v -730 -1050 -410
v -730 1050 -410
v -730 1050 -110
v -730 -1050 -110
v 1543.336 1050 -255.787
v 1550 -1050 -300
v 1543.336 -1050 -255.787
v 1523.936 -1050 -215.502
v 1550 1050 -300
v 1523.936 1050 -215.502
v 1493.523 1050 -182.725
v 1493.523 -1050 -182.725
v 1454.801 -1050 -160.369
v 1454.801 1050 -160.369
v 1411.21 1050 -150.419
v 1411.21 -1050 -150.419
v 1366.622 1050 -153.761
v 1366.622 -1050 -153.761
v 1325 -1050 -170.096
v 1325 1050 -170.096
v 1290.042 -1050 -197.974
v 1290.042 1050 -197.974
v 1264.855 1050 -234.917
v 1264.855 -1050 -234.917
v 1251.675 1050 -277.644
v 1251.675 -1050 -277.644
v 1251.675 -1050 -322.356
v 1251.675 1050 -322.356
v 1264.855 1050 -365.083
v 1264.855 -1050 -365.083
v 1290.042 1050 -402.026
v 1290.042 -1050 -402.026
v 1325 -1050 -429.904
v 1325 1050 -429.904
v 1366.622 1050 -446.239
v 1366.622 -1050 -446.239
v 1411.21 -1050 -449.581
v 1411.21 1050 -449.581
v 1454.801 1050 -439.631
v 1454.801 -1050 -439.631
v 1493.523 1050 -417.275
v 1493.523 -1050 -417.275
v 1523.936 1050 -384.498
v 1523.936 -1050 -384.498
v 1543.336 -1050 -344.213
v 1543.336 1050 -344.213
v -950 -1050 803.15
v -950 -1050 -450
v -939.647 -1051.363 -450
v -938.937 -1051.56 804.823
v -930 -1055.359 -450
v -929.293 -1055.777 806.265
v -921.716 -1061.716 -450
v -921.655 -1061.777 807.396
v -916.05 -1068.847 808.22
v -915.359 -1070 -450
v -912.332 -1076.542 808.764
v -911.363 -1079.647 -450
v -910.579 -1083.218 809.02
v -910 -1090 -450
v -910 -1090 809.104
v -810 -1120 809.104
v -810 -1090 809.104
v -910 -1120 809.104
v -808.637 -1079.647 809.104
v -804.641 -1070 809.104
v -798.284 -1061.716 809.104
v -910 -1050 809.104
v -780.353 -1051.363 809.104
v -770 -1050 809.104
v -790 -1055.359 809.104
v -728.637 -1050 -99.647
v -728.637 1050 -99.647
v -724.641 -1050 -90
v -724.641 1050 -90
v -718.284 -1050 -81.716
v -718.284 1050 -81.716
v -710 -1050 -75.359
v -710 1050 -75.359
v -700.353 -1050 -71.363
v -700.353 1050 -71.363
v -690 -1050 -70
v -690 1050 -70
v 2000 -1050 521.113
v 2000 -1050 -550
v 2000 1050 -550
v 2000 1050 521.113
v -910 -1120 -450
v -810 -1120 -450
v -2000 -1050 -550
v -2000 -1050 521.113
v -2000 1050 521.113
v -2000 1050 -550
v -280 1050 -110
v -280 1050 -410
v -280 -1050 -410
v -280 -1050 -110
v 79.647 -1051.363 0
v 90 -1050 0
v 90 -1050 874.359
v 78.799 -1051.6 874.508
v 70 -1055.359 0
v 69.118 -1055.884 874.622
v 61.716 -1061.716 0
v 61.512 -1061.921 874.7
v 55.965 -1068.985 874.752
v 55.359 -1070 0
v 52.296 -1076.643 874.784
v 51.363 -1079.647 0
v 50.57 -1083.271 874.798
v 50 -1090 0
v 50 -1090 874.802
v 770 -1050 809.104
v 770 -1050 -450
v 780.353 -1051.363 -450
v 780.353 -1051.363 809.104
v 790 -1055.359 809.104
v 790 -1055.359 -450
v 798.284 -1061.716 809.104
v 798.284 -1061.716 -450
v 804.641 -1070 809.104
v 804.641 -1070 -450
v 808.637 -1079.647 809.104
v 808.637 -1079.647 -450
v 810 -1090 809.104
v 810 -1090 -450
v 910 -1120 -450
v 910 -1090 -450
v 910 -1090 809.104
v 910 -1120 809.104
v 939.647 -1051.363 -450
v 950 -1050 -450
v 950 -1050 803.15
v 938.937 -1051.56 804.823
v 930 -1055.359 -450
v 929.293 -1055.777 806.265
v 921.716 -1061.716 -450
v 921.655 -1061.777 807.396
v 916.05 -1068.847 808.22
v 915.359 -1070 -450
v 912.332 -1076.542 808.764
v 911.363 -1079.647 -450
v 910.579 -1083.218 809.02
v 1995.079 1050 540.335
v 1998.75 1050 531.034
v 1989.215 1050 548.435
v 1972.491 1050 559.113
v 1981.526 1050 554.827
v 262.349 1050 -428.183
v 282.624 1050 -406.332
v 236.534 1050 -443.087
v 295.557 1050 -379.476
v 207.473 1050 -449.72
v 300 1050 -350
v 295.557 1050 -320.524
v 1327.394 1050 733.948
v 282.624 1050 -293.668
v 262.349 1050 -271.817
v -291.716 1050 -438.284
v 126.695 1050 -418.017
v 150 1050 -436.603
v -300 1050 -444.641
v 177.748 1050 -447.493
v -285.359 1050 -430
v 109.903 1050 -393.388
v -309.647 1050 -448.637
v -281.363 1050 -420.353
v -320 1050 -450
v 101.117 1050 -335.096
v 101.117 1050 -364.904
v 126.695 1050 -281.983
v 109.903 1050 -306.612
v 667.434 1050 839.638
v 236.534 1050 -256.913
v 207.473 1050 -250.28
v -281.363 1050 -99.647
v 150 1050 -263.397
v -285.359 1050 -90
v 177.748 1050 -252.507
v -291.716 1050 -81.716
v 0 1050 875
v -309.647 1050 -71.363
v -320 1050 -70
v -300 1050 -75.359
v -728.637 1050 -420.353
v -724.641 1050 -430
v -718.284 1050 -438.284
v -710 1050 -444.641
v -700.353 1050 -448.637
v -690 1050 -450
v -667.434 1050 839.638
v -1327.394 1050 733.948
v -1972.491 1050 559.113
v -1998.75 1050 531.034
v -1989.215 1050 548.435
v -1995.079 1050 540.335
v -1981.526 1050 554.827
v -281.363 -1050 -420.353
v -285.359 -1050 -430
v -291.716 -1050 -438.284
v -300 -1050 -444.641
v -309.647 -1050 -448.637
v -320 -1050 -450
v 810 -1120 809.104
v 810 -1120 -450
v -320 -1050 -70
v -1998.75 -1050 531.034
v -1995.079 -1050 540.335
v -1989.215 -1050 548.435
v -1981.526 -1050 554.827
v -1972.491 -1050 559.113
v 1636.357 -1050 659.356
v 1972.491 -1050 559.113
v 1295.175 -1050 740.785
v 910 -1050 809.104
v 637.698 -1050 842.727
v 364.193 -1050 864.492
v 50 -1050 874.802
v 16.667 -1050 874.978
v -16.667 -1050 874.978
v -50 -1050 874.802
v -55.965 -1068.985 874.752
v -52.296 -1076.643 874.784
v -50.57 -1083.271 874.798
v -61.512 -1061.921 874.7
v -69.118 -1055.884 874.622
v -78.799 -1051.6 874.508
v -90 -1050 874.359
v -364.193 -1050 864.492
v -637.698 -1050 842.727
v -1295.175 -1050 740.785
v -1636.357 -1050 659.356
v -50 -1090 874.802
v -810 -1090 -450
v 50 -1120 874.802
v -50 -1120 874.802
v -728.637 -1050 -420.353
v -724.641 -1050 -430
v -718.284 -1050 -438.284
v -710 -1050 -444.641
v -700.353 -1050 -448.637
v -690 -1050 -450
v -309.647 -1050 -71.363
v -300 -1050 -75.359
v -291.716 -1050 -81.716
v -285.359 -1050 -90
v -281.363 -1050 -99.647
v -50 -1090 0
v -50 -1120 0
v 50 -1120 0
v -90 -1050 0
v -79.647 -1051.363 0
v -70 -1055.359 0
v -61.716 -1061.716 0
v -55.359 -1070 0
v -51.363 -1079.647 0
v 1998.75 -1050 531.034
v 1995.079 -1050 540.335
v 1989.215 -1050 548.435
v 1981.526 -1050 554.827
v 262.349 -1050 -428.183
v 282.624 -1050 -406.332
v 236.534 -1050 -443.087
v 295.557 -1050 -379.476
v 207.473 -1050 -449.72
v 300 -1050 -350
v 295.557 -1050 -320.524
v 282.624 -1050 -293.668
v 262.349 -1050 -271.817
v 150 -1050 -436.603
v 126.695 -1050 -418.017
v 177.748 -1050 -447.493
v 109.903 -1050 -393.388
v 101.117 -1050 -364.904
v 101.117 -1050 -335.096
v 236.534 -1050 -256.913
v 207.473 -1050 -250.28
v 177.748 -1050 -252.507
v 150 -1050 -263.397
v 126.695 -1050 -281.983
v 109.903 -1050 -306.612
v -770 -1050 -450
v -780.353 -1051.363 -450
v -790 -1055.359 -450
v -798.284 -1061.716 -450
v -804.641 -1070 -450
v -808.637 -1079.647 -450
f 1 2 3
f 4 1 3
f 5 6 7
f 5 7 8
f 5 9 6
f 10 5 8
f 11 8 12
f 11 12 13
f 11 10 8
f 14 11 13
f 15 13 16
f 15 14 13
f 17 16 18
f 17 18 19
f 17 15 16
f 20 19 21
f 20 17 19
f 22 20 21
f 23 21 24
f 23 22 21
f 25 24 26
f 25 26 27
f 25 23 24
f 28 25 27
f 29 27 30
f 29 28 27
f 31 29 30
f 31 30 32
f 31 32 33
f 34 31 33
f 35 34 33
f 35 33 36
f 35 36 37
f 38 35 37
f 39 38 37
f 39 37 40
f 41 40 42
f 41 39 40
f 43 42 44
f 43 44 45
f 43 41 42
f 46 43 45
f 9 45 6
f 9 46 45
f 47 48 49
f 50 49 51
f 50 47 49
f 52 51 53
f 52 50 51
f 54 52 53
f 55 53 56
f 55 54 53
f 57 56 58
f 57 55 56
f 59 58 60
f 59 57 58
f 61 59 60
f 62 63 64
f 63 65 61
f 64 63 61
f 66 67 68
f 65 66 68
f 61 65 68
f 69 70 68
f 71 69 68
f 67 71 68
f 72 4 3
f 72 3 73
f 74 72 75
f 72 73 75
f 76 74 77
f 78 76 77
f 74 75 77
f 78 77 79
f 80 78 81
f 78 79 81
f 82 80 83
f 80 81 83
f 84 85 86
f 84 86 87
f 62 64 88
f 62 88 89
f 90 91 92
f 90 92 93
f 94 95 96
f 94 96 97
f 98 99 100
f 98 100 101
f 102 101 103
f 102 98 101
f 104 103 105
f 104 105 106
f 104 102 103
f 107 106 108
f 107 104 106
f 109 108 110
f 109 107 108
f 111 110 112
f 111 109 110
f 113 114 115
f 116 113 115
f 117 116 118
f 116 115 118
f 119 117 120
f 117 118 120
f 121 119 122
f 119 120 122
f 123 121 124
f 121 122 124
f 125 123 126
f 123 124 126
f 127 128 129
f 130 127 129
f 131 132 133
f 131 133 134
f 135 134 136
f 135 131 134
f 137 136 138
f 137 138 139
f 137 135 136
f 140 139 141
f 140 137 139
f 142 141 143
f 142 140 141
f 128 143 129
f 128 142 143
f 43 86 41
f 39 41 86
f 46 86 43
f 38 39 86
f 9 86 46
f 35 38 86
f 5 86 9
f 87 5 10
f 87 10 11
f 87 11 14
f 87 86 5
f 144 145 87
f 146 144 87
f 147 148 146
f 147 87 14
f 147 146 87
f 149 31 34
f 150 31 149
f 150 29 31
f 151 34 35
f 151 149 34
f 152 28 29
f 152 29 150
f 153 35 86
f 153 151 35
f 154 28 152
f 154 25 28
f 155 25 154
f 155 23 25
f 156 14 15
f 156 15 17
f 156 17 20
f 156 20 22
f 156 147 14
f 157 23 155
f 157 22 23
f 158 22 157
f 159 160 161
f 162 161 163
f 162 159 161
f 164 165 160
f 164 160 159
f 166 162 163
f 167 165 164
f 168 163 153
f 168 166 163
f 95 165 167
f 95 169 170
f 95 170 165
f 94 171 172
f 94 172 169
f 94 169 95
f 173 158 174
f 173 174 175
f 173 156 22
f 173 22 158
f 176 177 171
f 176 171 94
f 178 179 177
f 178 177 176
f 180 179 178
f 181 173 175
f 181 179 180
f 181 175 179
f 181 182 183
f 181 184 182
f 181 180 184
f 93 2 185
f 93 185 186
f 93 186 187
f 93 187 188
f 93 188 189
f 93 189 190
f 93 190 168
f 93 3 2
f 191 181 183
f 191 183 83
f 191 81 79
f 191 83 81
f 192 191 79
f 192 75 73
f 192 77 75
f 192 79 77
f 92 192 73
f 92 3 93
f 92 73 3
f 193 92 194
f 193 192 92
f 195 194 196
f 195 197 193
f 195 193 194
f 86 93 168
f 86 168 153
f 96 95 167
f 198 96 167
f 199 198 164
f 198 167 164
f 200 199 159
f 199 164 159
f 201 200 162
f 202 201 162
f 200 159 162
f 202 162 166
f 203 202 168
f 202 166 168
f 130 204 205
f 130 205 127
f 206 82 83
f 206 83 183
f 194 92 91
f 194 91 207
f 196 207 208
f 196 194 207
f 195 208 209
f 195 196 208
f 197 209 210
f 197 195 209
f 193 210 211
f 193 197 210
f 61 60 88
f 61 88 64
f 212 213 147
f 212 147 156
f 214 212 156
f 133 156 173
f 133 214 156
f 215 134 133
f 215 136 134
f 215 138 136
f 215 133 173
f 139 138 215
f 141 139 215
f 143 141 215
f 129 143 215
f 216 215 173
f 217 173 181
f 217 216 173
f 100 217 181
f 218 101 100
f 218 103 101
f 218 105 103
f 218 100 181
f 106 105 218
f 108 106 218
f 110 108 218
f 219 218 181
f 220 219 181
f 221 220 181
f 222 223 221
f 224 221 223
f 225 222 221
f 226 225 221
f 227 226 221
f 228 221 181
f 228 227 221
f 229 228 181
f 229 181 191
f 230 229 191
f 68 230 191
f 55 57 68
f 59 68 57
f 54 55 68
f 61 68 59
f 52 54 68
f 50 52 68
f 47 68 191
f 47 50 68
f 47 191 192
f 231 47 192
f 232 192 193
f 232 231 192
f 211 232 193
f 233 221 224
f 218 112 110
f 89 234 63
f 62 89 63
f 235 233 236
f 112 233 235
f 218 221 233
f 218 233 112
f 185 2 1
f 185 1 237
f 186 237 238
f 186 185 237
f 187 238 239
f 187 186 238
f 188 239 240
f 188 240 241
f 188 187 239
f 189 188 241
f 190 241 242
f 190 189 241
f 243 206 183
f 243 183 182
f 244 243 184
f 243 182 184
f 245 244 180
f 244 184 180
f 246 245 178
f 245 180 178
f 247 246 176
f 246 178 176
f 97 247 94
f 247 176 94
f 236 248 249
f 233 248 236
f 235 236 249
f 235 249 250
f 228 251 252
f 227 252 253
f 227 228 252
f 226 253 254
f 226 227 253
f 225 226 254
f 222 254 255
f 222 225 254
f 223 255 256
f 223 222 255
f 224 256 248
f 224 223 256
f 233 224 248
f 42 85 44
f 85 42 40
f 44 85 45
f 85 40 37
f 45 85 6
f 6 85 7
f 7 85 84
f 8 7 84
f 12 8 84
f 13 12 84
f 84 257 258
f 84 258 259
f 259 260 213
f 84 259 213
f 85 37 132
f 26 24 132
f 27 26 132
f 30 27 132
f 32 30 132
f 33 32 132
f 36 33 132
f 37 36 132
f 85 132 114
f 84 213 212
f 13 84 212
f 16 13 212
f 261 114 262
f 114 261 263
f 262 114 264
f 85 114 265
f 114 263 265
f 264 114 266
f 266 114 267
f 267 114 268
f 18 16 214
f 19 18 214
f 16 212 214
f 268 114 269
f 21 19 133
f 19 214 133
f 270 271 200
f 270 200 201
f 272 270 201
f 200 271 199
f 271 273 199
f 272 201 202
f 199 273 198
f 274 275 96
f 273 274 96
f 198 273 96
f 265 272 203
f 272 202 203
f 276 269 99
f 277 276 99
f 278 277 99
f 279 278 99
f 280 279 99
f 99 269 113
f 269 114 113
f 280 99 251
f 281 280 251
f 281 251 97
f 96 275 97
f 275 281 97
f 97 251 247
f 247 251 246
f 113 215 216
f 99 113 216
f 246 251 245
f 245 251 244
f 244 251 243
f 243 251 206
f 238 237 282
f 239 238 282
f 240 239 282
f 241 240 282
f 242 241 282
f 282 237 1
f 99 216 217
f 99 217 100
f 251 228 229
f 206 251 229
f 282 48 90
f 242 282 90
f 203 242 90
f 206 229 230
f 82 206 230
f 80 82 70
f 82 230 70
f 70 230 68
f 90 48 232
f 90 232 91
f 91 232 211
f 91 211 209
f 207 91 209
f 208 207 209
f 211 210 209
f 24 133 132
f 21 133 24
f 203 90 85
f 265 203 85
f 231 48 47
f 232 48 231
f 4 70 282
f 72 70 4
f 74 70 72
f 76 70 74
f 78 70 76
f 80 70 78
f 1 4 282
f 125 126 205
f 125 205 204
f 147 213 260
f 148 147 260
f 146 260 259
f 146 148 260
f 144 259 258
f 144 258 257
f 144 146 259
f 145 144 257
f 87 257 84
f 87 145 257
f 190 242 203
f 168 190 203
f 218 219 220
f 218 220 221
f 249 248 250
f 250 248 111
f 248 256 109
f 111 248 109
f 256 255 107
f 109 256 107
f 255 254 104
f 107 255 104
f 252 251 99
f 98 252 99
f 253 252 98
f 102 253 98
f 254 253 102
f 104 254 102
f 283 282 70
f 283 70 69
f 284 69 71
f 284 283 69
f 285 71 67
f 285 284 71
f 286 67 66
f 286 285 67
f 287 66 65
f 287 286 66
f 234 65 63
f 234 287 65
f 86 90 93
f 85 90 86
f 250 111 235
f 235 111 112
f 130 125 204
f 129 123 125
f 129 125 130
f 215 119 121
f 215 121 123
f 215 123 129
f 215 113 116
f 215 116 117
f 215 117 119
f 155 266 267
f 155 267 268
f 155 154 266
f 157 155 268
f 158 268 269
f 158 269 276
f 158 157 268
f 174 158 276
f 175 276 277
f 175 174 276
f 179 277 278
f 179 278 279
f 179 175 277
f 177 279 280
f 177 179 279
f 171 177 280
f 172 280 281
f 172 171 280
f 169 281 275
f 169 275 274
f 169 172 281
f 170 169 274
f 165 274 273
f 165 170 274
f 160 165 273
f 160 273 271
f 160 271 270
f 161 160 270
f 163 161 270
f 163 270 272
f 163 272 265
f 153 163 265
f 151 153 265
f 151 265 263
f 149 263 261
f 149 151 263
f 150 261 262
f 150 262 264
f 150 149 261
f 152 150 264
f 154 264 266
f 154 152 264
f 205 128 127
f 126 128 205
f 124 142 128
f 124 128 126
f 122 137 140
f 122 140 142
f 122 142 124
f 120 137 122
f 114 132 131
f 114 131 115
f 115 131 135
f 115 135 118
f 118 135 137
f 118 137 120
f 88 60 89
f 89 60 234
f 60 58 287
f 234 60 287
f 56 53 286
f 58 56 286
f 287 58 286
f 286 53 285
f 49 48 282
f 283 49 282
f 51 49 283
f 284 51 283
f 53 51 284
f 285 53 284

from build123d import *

# Parameters (mm, degrees)
F0_W         = 450
F0_H         = 380
F0_R         = 100
F0_R_2       = 150
F1_DEPTH     = 1050
F2_W         = 100
F2_H         = 1259.1041287501
F2_H_2       = 874.8020976761
F3_DEPTH     = 70
F4_T1_DEPTH  = 2100
F4_T3_DEPTH  = 1259.1041287501
F4_T8_DEPTH  = 1259.1041287501
F4_S9_R      = 6316.3461538462
F4_T10_DEPTH = 632
F4_T14_DEPTH = 874.8020976761
F4_S15_R     = 6316.3461538462
F4_T16_DEPTH = 440
F4_T20_DEPTH = 874.8020976761
F4_S21_R     = 6316.3461538462
F4_T22_DEPTH = 440
F4_T26_DEPTH = 1259.1041287501
F4_S27_R     = 6316.3461538462
F4_T28_DEPTH = 632
F4_T29_DEPTH = 2244.8937294243


# Not quite as in the source:
# - a fillet or chamfer that OpenCascade refuses, or shapes differently, is made with other operations: its cross-section is extruded or revolved along the edge and cut away or added


with BuildPart() as f1:
    # F0 (on Front) → F1 (new body, symmetric)
    with BuildSketch(Plane.XZ):
        with BuildLine():
            Line((-2000, -550), (2000, -550))
            Line((2000, -550), (2000, 550))
            ThreePointArc((2000, 550), (0, 875), (-2000, 550))
            Line((-2000, 550), (-2000, -550))
        make_face()
        with Locations((-505, -260)):
            Rectangle(F0_W, F0_H, mode=Mode.SUBTRACT)
        with Locations((200, -350)):
            Circle(F0_R, mode=Mode.SUBTRACT)
        with Locations((1400, -300)):
            Circle(F0_R_2, mode=Mode.SUBTRACT)
    extrude(amount=F1_DEPTH, both=True)

    # F2 (on face) → F3 (join)
    with BuildSketch(Plane.XZ.offset(1050)):
        with Locations((-860, 179.552064375)):
            Rectangle(F2_W, F2_H)
        with Locations((0, 437.401048838)):
            Rectangle(F2_W, F2_H_2)
        with Locations((860, 179.552064375)):
            Rectangle(F2_W, F2_H)
    extrude(amount=F3_DEPTH)

    # F4: fillet of radius 40 on 12 edges, made by hand

    # F4_s2 → F4_t1 (join)
    with BuildSketch(Plane.XZ.offset(-1050)):
        with BuildLine():
            ThreePointArc((-730, -410), (-718.2842712475, -438.2842712475), (-690, -450))
            Line((-690, -450), (-730, -450))
            Line((-730, -450), (-730, -410))
        make_face()
        with BuildLine():
            ThreePointArc((-730, -110), (-718.2842712475, -81.7157287525), (-690, -70))
            Line((-690, -70), (-730, -70))
            Line((-730, -70), (-730, -110))
        make_face()
        with BuildLine():
            ThreePointArc((-280, -410), (-291.7157287525, -438.2842712475), (-320, -450))
            Line((-320, -450), (-280, -450))
            Line((-280, -450), (-280, -410))
        make_face()
        with BuildLine():
            ThreePointArc((-320, -70), (-291.7157287525, -81.7157287525), (-280, -110))
            Line((-280, -110), (-280, -70))
            Line((-280, -70), (-320, -70))
        make_face()
    extrude(amount=F4_T1_DEPTH)

    # F4_s4 → F4_t3 (join)
    with BuildSketch(Plane.XY.offset(-450)):
        with BuildLine():
            ThreePointArc((-770, -1050), (-798.2842712475, -1061.7157287525), (-810, -1090))
            Line((-810, -1090), (-810, -1050))
            Line((-810, -1050), (-770, -1050))
        make_face()
        with BuildLine():
            ThreePointArc((770, -1050), (798.2842712475, -1061.7157287525), (810, -1090))
            Line((810, -1090), (810, -1050))
            Line((810, -1050), (770, -1050))
        make_face()
    extrude(amount=F4_T3_DEPTH)


with BuildPart() as f4_tool6:
    # F4_s7 → F4_t8 (new body)
    with BuildSketch(Plane.XY.offset(-450)):
        with BuildLine():
            ThreePointArc((950, -1050), (921.7157287525, -1061.7157287525), (910, -1090))
            Line((910, -1090), (910, -1050))
            Line((910, -1050), (950, -1050))
        make_face()
    extrude(amount=F4_T8_DEPTH)

    # F4_s9 → F4_t10 (intersect, symmetric)
    with BuildSketch(Plane.XZ.offset(1070)):
        with Locations((0, -5441.3461538462)):
            Circle(F4_S9_R)
    extrude(amount=F4_T10_DEPTH, both=True, mode=Mode.INTERSECT)


with BuildPart() as f1_1:
    add(f1.part)

    # F4_t5: union F4_tool6
    add(f4_tool6.part)


with BuildPart() as f4_tool12:
    # F4_s13 → F4_t14 (new body)
    with BuildSketch(Plane.XY):
        with BuildLine():
            ThreePointArc((90, -1050), (61.7157287525, -1061.7157287525), (50, -1090))
            Line((50, -1090), (50, -1050))
            Line((50, -1050), (90, -1050))
        make_face()
    extrude(amount=F4_T14_DEPTH)

    # F4_s15 → F4_t16 (intersect, symmetric)
    with BuildSketch(Plane.XZ.offset(1070)):
        with Locations((0, -5441.3461538462)):
            Circle(F4_S15_R)
    extrude(amount=F4_T16_DEPTH, both=True, mode=Mode.INTERSECT)


with BuildPart() as f1_2:
    add(f1_1.part)

    # F4_t11: union F4_tool12
    add(f4_tool12.part)


with BuildPart() as f4_tool18:
    # F4_s19 → F4_t20 (new body)
    with BuildSketch(Plane.XY.offset(874.8020976761)):
        with BuildLine():
            ThreePointArc((-90, -1050), (-61.7157287525, -1061.7157287525), (-50, -1090))
            Line((-50, -1090), (-50, -1050))
            Line((-50, -1050), (-90, -1050))
        make_face()
    extrude(amount=-F4_T20_DEPTH)

    # F4_s21 → F4_t22 (intersect, symmetric)
    with BuildSketch(Plane.XZ.offset(1070)):
        with Locations((0, -5441.3461538462)):
            Circle(F4_S21_R)
    extrude(amount=F4_T22_DEPTH, both=True, mode=Mode.INTERSECT)


with BuildPart() as f1_3:
    add(f1_2.part)

    # F4_t17: union F4_tool18
    add(f4_tool18.part)


with BuildPart() as f4_tool24:
    # F4_s25 → F4_t26 (new body)
    with BuildSketch(Plane.XY.offset(809.1041287501)):
        with BuildLine():
            ThreePointArc((-950, -1050), (-921.7157287525, -1061.7157287525), (-910, -1090))
            Line((-910, -1090), (-910, -1050))
            Line((-910, -1050), (-950, -1050))
        make_face()
    extrude(amount=-F4_T26_DEPTH)

    # F4_s27 → F4_t28 (intersect, symmetric)
    with BuildSketch(Plane.XZ.offset(1070)):
        with Locations((0, -5441.3461538462)):
            Circle(F4_S27_R)
    extrude(amount=F4_T28_DEPTH, both=True, mode=Mode.INTERSECT)


with BuildPart() as f1_4:
    add(f1_3.part)

    # F4_t23: union F4_tool24
    add(f4_tool24.part)

    # F4_s30 → F4_t29 (cut)
    with BuildSketch(Plane.XZ.offset(-1122.4468647121)):
        with BuildLine():
            ThreePointArc((1972.4913441799, 559.1127146357), (1992.4010321379, 544.5689271514), (2000, 521.1131577886))
            Line((2000, 521.1131577886), (2000, 550))
            ThreePointArc((2000, 550), (1986.2508981214, 554.5721331987), (1972.4913441799, 559.1127146357))
        make_face()
        with BuildLine():
            ThreePointArc((-2000, 521.1131577886), (-1992.4010321379, 544.5689271514), (-1972.4913441799, 559.1127146357))
            ThreePointArc((-1972.4913441799, 559.1127146357), (-1986.2508981214, 554.5721331987), (-2000, 550))
            Line((-2000, 550), (-2000, 521.1131577886))
        make_face()
    extrude(amount=F4_T29_DEPTH, mode=Mode.SUBTRACT)


solid = f1_4.part
